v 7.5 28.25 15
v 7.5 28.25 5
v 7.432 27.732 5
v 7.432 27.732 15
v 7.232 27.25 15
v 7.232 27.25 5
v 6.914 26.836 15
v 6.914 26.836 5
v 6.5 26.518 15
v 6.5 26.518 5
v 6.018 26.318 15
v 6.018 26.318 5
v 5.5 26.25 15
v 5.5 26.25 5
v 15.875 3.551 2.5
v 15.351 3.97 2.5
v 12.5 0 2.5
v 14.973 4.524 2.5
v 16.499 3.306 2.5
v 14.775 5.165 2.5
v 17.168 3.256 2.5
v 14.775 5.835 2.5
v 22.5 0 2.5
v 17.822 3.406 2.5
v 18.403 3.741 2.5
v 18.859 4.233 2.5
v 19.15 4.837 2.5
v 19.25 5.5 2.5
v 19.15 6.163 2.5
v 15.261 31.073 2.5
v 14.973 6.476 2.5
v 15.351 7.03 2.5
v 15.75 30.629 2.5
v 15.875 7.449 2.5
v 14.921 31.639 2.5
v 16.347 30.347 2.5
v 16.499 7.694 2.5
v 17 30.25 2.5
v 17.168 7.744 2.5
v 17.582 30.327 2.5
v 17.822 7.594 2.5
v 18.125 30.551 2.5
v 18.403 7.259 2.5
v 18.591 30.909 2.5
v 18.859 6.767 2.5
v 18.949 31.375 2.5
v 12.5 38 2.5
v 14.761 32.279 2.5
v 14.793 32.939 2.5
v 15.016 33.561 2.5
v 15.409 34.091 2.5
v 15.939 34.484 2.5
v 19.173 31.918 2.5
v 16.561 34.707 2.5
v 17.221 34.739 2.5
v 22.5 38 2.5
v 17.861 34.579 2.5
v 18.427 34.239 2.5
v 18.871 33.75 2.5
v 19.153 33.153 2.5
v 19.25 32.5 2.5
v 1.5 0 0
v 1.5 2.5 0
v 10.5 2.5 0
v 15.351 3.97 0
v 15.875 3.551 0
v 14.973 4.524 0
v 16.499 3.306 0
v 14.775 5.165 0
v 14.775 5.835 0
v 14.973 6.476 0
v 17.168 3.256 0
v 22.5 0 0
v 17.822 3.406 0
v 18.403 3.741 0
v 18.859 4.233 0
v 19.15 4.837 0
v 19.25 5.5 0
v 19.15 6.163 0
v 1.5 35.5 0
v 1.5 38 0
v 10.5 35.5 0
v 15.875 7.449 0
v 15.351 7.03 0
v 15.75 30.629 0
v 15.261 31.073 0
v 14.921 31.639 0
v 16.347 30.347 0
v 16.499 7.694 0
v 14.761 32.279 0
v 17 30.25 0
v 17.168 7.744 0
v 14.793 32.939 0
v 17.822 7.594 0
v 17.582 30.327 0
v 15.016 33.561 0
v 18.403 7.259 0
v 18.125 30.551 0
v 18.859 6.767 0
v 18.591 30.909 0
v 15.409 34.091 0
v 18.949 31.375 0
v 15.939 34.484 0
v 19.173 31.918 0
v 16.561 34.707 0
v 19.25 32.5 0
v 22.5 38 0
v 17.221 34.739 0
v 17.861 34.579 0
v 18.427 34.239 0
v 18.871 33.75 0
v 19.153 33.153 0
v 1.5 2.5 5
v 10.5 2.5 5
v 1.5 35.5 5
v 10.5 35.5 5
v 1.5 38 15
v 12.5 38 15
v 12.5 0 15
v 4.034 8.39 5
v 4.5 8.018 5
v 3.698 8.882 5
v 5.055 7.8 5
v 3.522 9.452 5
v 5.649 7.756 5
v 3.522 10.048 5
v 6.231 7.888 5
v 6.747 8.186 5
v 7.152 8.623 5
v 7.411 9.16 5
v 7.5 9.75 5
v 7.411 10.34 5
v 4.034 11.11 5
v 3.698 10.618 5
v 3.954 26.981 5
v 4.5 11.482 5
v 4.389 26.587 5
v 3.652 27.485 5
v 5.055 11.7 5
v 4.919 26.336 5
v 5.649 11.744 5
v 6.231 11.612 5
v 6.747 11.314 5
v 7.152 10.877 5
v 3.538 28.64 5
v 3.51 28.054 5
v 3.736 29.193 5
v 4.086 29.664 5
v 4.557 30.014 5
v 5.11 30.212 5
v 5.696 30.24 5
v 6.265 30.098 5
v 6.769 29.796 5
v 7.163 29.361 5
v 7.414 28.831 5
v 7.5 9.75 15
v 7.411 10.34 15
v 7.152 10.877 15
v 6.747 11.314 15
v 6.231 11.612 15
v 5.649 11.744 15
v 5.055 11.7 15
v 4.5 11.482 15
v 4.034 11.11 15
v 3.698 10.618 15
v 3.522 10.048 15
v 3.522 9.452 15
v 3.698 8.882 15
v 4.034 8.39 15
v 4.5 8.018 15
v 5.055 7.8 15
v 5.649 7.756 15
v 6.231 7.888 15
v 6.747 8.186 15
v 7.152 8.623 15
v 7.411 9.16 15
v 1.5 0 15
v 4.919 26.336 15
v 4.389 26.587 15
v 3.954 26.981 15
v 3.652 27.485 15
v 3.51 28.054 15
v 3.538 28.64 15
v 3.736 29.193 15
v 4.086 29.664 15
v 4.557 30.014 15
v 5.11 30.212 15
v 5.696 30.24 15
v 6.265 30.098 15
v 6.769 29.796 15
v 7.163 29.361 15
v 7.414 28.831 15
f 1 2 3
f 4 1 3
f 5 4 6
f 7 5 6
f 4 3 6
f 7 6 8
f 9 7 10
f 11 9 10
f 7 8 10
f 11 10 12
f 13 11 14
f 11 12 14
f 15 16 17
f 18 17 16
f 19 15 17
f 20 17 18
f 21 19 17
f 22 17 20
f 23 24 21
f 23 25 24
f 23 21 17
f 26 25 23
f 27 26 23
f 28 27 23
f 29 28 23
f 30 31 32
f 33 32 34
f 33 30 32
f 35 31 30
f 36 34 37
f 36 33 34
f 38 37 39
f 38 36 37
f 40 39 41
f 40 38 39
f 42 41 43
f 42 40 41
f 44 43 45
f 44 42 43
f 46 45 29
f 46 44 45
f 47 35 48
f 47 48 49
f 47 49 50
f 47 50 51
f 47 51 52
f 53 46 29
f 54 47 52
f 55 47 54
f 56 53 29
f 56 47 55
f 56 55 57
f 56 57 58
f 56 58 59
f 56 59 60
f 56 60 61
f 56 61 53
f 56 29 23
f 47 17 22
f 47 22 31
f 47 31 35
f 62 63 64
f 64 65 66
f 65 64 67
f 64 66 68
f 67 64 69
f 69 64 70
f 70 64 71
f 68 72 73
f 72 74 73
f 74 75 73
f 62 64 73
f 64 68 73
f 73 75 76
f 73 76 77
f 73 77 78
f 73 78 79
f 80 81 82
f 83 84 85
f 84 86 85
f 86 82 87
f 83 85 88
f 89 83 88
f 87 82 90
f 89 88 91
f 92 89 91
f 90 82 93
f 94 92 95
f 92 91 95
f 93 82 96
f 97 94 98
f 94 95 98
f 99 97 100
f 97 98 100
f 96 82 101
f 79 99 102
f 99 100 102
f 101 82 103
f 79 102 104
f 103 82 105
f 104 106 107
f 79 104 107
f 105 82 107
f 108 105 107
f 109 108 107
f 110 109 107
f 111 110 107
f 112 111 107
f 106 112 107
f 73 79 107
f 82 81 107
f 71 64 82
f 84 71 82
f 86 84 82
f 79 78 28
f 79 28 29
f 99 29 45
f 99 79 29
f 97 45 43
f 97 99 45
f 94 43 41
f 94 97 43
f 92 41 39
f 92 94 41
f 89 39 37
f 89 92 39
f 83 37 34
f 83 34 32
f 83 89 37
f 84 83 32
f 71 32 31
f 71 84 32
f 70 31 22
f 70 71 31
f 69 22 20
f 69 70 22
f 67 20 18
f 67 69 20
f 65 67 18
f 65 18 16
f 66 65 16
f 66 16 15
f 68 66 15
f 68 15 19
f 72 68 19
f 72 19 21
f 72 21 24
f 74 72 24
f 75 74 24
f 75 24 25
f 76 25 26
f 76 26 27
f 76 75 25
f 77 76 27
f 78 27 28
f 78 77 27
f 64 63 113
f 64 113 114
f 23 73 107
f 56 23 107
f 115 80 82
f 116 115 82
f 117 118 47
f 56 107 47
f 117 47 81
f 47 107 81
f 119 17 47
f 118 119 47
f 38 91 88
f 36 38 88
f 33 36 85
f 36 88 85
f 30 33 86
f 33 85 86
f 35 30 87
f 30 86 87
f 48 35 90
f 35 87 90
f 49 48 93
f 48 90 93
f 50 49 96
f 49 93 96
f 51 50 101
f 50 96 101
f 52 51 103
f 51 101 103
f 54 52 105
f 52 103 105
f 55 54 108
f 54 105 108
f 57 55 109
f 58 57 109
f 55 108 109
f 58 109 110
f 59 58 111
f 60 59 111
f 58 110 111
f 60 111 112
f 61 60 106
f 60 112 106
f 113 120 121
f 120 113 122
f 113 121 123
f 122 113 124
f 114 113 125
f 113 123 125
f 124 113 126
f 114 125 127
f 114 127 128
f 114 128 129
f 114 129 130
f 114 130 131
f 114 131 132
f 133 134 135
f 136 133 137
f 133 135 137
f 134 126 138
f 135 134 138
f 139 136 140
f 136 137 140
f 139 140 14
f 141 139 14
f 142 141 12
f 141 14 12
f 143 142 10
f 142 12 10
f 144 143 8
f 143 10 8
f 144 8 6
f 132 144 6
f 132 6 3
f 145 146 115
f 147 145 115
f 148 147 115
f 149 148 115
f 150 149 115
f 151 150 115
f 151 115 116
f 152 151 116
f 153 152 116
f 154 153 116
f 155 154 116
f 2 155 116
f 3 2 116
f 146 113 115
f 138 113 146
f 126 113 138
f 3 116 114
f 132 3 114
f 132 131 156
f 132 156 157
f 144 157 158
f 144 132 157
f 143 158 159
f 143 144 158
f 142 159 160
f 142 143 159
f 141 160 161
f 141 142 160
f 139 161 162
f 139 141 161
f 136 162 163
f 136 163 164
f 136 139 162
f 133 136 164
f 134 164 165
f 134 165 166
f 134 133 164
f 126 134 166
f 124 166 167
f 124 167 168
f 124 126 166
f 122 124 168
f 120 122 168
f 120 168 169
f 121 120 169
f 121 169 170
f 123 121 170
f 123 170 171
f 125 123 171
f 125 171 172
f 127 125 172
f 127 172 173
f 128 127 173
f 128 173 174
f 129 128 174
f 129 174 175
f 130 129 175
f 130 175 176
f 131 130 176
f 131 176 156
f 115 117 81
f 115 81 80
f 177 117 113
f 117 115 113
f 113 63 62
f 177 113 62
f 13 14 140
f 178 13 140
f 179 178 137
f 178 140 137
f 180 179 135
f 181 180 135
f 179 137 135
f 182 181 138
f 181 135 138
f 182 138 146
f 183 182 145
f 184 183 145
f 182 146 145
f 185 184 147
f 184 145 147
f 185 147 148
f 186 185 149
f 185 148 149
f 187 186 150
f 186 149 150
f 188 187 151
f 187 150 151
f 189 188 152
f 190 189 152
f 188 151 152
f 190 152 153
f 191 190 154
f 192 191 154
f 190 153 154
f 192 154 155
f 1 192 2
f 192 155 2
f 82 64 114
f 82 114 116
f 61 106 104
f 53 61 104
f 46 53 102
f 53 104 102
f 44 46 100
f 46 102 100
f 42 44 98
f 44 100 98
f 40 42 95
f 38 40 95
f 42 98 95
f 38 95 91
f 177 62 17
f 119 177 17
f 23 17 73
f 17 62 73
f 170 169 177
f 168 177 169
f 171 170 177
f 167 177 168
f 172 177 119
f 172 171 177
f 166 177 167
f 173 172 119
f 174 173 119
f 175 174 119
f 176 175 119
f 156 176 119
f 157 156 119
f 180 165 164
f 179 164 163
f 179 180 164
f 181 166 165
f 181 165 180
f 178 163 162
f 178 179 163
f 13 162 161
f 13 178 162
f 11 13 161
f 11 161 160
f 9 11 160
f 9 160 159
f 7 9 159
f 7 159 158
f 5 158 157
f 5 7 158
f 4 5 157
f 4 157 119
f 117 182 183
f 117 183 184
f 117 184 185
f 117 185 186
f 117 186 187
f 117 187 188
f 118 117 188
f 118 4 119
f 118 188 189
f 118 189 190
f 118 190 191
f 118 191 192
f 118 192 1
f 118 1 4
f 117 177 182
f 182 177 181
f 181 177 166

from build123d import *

# Parameters (mm, degrees)
F0_R     = 2.25
F1_DEPTH = 2.5
F2_R     = 2
F3_DEPTH = 15
F4_W     = 9
F4_H     = 33
F5_DEPTH = 5


with BuildPart() as f1:
    # F0 (on Top) → F1 (new body)
    with BuildSketch(Plane.XY):
        with BuildLine():
            ThreePointArc((19.25, 32.5), (15.40901, 34.09099), (17, 30.25))
            ThreePointArc((17, 30.25), (18.59099, 30.90901), (19.25, 32.5))
        make_face()
        Polygon((12.5, 19), (12.5, 0), (22.5, 0), (22.5, 38), (12.5, 38), align=None)
        with Locations((17, 5.5)):
            Circle(F0_R, mode=Mode.SUBTRACT)
        with BuildLine():
            ThreePointArc((19.25, 32.5), (18.59099, 30.90901), (17, 30.25))
            ThreePointArc((17, 30.25), (15.40901, 34.09099), (19.25, 32.5))
        make_face(mode=Mode.SUBTRACT)
    extrude(amount=F1_DEPTH)

    # F2 (on Top) → F3 (join)
    with BuildSketch(Plane.XY):
        with BuildLine():
            ThreePointArc((7.5, 28.25), (4.085786, 29.664214), (5.5, 26.25))
            ThreePointArc((5.5, 26.25), (6.914214, 26.835786), (7.5, 28.25))
        make_face()
        Polygon((1.5, 19), (1.5, 0), (12.5, 0), (12.5, 38), (1.5, 38), align=None)
        with Locations((5.5, 9.75)):
            Circle(F2_R, mode=Mode.SUBTRACT)
        with BuildLine():
            ThreePointArc((7.5, 28.25), (6.914214, 26.835786), (5.5, 26.25))
            ThreePointArc((5.5, 26.25), (4.085786, 29.664214), (7.5, 28.25))
        make_face(mode=Mode.SUBTRACT)
    extrude(amount=F3_DEPTH)

    # F4 (on Top) → F5 (cut)
    with BuildSketch(Plane.XY):
        with Locations((6, 19)):
            Rectangle(F4_W, F4_H)
    extrude(amount=F5_DEPTH, mode=Mode.SUBTRACT)


solid = f1.part
